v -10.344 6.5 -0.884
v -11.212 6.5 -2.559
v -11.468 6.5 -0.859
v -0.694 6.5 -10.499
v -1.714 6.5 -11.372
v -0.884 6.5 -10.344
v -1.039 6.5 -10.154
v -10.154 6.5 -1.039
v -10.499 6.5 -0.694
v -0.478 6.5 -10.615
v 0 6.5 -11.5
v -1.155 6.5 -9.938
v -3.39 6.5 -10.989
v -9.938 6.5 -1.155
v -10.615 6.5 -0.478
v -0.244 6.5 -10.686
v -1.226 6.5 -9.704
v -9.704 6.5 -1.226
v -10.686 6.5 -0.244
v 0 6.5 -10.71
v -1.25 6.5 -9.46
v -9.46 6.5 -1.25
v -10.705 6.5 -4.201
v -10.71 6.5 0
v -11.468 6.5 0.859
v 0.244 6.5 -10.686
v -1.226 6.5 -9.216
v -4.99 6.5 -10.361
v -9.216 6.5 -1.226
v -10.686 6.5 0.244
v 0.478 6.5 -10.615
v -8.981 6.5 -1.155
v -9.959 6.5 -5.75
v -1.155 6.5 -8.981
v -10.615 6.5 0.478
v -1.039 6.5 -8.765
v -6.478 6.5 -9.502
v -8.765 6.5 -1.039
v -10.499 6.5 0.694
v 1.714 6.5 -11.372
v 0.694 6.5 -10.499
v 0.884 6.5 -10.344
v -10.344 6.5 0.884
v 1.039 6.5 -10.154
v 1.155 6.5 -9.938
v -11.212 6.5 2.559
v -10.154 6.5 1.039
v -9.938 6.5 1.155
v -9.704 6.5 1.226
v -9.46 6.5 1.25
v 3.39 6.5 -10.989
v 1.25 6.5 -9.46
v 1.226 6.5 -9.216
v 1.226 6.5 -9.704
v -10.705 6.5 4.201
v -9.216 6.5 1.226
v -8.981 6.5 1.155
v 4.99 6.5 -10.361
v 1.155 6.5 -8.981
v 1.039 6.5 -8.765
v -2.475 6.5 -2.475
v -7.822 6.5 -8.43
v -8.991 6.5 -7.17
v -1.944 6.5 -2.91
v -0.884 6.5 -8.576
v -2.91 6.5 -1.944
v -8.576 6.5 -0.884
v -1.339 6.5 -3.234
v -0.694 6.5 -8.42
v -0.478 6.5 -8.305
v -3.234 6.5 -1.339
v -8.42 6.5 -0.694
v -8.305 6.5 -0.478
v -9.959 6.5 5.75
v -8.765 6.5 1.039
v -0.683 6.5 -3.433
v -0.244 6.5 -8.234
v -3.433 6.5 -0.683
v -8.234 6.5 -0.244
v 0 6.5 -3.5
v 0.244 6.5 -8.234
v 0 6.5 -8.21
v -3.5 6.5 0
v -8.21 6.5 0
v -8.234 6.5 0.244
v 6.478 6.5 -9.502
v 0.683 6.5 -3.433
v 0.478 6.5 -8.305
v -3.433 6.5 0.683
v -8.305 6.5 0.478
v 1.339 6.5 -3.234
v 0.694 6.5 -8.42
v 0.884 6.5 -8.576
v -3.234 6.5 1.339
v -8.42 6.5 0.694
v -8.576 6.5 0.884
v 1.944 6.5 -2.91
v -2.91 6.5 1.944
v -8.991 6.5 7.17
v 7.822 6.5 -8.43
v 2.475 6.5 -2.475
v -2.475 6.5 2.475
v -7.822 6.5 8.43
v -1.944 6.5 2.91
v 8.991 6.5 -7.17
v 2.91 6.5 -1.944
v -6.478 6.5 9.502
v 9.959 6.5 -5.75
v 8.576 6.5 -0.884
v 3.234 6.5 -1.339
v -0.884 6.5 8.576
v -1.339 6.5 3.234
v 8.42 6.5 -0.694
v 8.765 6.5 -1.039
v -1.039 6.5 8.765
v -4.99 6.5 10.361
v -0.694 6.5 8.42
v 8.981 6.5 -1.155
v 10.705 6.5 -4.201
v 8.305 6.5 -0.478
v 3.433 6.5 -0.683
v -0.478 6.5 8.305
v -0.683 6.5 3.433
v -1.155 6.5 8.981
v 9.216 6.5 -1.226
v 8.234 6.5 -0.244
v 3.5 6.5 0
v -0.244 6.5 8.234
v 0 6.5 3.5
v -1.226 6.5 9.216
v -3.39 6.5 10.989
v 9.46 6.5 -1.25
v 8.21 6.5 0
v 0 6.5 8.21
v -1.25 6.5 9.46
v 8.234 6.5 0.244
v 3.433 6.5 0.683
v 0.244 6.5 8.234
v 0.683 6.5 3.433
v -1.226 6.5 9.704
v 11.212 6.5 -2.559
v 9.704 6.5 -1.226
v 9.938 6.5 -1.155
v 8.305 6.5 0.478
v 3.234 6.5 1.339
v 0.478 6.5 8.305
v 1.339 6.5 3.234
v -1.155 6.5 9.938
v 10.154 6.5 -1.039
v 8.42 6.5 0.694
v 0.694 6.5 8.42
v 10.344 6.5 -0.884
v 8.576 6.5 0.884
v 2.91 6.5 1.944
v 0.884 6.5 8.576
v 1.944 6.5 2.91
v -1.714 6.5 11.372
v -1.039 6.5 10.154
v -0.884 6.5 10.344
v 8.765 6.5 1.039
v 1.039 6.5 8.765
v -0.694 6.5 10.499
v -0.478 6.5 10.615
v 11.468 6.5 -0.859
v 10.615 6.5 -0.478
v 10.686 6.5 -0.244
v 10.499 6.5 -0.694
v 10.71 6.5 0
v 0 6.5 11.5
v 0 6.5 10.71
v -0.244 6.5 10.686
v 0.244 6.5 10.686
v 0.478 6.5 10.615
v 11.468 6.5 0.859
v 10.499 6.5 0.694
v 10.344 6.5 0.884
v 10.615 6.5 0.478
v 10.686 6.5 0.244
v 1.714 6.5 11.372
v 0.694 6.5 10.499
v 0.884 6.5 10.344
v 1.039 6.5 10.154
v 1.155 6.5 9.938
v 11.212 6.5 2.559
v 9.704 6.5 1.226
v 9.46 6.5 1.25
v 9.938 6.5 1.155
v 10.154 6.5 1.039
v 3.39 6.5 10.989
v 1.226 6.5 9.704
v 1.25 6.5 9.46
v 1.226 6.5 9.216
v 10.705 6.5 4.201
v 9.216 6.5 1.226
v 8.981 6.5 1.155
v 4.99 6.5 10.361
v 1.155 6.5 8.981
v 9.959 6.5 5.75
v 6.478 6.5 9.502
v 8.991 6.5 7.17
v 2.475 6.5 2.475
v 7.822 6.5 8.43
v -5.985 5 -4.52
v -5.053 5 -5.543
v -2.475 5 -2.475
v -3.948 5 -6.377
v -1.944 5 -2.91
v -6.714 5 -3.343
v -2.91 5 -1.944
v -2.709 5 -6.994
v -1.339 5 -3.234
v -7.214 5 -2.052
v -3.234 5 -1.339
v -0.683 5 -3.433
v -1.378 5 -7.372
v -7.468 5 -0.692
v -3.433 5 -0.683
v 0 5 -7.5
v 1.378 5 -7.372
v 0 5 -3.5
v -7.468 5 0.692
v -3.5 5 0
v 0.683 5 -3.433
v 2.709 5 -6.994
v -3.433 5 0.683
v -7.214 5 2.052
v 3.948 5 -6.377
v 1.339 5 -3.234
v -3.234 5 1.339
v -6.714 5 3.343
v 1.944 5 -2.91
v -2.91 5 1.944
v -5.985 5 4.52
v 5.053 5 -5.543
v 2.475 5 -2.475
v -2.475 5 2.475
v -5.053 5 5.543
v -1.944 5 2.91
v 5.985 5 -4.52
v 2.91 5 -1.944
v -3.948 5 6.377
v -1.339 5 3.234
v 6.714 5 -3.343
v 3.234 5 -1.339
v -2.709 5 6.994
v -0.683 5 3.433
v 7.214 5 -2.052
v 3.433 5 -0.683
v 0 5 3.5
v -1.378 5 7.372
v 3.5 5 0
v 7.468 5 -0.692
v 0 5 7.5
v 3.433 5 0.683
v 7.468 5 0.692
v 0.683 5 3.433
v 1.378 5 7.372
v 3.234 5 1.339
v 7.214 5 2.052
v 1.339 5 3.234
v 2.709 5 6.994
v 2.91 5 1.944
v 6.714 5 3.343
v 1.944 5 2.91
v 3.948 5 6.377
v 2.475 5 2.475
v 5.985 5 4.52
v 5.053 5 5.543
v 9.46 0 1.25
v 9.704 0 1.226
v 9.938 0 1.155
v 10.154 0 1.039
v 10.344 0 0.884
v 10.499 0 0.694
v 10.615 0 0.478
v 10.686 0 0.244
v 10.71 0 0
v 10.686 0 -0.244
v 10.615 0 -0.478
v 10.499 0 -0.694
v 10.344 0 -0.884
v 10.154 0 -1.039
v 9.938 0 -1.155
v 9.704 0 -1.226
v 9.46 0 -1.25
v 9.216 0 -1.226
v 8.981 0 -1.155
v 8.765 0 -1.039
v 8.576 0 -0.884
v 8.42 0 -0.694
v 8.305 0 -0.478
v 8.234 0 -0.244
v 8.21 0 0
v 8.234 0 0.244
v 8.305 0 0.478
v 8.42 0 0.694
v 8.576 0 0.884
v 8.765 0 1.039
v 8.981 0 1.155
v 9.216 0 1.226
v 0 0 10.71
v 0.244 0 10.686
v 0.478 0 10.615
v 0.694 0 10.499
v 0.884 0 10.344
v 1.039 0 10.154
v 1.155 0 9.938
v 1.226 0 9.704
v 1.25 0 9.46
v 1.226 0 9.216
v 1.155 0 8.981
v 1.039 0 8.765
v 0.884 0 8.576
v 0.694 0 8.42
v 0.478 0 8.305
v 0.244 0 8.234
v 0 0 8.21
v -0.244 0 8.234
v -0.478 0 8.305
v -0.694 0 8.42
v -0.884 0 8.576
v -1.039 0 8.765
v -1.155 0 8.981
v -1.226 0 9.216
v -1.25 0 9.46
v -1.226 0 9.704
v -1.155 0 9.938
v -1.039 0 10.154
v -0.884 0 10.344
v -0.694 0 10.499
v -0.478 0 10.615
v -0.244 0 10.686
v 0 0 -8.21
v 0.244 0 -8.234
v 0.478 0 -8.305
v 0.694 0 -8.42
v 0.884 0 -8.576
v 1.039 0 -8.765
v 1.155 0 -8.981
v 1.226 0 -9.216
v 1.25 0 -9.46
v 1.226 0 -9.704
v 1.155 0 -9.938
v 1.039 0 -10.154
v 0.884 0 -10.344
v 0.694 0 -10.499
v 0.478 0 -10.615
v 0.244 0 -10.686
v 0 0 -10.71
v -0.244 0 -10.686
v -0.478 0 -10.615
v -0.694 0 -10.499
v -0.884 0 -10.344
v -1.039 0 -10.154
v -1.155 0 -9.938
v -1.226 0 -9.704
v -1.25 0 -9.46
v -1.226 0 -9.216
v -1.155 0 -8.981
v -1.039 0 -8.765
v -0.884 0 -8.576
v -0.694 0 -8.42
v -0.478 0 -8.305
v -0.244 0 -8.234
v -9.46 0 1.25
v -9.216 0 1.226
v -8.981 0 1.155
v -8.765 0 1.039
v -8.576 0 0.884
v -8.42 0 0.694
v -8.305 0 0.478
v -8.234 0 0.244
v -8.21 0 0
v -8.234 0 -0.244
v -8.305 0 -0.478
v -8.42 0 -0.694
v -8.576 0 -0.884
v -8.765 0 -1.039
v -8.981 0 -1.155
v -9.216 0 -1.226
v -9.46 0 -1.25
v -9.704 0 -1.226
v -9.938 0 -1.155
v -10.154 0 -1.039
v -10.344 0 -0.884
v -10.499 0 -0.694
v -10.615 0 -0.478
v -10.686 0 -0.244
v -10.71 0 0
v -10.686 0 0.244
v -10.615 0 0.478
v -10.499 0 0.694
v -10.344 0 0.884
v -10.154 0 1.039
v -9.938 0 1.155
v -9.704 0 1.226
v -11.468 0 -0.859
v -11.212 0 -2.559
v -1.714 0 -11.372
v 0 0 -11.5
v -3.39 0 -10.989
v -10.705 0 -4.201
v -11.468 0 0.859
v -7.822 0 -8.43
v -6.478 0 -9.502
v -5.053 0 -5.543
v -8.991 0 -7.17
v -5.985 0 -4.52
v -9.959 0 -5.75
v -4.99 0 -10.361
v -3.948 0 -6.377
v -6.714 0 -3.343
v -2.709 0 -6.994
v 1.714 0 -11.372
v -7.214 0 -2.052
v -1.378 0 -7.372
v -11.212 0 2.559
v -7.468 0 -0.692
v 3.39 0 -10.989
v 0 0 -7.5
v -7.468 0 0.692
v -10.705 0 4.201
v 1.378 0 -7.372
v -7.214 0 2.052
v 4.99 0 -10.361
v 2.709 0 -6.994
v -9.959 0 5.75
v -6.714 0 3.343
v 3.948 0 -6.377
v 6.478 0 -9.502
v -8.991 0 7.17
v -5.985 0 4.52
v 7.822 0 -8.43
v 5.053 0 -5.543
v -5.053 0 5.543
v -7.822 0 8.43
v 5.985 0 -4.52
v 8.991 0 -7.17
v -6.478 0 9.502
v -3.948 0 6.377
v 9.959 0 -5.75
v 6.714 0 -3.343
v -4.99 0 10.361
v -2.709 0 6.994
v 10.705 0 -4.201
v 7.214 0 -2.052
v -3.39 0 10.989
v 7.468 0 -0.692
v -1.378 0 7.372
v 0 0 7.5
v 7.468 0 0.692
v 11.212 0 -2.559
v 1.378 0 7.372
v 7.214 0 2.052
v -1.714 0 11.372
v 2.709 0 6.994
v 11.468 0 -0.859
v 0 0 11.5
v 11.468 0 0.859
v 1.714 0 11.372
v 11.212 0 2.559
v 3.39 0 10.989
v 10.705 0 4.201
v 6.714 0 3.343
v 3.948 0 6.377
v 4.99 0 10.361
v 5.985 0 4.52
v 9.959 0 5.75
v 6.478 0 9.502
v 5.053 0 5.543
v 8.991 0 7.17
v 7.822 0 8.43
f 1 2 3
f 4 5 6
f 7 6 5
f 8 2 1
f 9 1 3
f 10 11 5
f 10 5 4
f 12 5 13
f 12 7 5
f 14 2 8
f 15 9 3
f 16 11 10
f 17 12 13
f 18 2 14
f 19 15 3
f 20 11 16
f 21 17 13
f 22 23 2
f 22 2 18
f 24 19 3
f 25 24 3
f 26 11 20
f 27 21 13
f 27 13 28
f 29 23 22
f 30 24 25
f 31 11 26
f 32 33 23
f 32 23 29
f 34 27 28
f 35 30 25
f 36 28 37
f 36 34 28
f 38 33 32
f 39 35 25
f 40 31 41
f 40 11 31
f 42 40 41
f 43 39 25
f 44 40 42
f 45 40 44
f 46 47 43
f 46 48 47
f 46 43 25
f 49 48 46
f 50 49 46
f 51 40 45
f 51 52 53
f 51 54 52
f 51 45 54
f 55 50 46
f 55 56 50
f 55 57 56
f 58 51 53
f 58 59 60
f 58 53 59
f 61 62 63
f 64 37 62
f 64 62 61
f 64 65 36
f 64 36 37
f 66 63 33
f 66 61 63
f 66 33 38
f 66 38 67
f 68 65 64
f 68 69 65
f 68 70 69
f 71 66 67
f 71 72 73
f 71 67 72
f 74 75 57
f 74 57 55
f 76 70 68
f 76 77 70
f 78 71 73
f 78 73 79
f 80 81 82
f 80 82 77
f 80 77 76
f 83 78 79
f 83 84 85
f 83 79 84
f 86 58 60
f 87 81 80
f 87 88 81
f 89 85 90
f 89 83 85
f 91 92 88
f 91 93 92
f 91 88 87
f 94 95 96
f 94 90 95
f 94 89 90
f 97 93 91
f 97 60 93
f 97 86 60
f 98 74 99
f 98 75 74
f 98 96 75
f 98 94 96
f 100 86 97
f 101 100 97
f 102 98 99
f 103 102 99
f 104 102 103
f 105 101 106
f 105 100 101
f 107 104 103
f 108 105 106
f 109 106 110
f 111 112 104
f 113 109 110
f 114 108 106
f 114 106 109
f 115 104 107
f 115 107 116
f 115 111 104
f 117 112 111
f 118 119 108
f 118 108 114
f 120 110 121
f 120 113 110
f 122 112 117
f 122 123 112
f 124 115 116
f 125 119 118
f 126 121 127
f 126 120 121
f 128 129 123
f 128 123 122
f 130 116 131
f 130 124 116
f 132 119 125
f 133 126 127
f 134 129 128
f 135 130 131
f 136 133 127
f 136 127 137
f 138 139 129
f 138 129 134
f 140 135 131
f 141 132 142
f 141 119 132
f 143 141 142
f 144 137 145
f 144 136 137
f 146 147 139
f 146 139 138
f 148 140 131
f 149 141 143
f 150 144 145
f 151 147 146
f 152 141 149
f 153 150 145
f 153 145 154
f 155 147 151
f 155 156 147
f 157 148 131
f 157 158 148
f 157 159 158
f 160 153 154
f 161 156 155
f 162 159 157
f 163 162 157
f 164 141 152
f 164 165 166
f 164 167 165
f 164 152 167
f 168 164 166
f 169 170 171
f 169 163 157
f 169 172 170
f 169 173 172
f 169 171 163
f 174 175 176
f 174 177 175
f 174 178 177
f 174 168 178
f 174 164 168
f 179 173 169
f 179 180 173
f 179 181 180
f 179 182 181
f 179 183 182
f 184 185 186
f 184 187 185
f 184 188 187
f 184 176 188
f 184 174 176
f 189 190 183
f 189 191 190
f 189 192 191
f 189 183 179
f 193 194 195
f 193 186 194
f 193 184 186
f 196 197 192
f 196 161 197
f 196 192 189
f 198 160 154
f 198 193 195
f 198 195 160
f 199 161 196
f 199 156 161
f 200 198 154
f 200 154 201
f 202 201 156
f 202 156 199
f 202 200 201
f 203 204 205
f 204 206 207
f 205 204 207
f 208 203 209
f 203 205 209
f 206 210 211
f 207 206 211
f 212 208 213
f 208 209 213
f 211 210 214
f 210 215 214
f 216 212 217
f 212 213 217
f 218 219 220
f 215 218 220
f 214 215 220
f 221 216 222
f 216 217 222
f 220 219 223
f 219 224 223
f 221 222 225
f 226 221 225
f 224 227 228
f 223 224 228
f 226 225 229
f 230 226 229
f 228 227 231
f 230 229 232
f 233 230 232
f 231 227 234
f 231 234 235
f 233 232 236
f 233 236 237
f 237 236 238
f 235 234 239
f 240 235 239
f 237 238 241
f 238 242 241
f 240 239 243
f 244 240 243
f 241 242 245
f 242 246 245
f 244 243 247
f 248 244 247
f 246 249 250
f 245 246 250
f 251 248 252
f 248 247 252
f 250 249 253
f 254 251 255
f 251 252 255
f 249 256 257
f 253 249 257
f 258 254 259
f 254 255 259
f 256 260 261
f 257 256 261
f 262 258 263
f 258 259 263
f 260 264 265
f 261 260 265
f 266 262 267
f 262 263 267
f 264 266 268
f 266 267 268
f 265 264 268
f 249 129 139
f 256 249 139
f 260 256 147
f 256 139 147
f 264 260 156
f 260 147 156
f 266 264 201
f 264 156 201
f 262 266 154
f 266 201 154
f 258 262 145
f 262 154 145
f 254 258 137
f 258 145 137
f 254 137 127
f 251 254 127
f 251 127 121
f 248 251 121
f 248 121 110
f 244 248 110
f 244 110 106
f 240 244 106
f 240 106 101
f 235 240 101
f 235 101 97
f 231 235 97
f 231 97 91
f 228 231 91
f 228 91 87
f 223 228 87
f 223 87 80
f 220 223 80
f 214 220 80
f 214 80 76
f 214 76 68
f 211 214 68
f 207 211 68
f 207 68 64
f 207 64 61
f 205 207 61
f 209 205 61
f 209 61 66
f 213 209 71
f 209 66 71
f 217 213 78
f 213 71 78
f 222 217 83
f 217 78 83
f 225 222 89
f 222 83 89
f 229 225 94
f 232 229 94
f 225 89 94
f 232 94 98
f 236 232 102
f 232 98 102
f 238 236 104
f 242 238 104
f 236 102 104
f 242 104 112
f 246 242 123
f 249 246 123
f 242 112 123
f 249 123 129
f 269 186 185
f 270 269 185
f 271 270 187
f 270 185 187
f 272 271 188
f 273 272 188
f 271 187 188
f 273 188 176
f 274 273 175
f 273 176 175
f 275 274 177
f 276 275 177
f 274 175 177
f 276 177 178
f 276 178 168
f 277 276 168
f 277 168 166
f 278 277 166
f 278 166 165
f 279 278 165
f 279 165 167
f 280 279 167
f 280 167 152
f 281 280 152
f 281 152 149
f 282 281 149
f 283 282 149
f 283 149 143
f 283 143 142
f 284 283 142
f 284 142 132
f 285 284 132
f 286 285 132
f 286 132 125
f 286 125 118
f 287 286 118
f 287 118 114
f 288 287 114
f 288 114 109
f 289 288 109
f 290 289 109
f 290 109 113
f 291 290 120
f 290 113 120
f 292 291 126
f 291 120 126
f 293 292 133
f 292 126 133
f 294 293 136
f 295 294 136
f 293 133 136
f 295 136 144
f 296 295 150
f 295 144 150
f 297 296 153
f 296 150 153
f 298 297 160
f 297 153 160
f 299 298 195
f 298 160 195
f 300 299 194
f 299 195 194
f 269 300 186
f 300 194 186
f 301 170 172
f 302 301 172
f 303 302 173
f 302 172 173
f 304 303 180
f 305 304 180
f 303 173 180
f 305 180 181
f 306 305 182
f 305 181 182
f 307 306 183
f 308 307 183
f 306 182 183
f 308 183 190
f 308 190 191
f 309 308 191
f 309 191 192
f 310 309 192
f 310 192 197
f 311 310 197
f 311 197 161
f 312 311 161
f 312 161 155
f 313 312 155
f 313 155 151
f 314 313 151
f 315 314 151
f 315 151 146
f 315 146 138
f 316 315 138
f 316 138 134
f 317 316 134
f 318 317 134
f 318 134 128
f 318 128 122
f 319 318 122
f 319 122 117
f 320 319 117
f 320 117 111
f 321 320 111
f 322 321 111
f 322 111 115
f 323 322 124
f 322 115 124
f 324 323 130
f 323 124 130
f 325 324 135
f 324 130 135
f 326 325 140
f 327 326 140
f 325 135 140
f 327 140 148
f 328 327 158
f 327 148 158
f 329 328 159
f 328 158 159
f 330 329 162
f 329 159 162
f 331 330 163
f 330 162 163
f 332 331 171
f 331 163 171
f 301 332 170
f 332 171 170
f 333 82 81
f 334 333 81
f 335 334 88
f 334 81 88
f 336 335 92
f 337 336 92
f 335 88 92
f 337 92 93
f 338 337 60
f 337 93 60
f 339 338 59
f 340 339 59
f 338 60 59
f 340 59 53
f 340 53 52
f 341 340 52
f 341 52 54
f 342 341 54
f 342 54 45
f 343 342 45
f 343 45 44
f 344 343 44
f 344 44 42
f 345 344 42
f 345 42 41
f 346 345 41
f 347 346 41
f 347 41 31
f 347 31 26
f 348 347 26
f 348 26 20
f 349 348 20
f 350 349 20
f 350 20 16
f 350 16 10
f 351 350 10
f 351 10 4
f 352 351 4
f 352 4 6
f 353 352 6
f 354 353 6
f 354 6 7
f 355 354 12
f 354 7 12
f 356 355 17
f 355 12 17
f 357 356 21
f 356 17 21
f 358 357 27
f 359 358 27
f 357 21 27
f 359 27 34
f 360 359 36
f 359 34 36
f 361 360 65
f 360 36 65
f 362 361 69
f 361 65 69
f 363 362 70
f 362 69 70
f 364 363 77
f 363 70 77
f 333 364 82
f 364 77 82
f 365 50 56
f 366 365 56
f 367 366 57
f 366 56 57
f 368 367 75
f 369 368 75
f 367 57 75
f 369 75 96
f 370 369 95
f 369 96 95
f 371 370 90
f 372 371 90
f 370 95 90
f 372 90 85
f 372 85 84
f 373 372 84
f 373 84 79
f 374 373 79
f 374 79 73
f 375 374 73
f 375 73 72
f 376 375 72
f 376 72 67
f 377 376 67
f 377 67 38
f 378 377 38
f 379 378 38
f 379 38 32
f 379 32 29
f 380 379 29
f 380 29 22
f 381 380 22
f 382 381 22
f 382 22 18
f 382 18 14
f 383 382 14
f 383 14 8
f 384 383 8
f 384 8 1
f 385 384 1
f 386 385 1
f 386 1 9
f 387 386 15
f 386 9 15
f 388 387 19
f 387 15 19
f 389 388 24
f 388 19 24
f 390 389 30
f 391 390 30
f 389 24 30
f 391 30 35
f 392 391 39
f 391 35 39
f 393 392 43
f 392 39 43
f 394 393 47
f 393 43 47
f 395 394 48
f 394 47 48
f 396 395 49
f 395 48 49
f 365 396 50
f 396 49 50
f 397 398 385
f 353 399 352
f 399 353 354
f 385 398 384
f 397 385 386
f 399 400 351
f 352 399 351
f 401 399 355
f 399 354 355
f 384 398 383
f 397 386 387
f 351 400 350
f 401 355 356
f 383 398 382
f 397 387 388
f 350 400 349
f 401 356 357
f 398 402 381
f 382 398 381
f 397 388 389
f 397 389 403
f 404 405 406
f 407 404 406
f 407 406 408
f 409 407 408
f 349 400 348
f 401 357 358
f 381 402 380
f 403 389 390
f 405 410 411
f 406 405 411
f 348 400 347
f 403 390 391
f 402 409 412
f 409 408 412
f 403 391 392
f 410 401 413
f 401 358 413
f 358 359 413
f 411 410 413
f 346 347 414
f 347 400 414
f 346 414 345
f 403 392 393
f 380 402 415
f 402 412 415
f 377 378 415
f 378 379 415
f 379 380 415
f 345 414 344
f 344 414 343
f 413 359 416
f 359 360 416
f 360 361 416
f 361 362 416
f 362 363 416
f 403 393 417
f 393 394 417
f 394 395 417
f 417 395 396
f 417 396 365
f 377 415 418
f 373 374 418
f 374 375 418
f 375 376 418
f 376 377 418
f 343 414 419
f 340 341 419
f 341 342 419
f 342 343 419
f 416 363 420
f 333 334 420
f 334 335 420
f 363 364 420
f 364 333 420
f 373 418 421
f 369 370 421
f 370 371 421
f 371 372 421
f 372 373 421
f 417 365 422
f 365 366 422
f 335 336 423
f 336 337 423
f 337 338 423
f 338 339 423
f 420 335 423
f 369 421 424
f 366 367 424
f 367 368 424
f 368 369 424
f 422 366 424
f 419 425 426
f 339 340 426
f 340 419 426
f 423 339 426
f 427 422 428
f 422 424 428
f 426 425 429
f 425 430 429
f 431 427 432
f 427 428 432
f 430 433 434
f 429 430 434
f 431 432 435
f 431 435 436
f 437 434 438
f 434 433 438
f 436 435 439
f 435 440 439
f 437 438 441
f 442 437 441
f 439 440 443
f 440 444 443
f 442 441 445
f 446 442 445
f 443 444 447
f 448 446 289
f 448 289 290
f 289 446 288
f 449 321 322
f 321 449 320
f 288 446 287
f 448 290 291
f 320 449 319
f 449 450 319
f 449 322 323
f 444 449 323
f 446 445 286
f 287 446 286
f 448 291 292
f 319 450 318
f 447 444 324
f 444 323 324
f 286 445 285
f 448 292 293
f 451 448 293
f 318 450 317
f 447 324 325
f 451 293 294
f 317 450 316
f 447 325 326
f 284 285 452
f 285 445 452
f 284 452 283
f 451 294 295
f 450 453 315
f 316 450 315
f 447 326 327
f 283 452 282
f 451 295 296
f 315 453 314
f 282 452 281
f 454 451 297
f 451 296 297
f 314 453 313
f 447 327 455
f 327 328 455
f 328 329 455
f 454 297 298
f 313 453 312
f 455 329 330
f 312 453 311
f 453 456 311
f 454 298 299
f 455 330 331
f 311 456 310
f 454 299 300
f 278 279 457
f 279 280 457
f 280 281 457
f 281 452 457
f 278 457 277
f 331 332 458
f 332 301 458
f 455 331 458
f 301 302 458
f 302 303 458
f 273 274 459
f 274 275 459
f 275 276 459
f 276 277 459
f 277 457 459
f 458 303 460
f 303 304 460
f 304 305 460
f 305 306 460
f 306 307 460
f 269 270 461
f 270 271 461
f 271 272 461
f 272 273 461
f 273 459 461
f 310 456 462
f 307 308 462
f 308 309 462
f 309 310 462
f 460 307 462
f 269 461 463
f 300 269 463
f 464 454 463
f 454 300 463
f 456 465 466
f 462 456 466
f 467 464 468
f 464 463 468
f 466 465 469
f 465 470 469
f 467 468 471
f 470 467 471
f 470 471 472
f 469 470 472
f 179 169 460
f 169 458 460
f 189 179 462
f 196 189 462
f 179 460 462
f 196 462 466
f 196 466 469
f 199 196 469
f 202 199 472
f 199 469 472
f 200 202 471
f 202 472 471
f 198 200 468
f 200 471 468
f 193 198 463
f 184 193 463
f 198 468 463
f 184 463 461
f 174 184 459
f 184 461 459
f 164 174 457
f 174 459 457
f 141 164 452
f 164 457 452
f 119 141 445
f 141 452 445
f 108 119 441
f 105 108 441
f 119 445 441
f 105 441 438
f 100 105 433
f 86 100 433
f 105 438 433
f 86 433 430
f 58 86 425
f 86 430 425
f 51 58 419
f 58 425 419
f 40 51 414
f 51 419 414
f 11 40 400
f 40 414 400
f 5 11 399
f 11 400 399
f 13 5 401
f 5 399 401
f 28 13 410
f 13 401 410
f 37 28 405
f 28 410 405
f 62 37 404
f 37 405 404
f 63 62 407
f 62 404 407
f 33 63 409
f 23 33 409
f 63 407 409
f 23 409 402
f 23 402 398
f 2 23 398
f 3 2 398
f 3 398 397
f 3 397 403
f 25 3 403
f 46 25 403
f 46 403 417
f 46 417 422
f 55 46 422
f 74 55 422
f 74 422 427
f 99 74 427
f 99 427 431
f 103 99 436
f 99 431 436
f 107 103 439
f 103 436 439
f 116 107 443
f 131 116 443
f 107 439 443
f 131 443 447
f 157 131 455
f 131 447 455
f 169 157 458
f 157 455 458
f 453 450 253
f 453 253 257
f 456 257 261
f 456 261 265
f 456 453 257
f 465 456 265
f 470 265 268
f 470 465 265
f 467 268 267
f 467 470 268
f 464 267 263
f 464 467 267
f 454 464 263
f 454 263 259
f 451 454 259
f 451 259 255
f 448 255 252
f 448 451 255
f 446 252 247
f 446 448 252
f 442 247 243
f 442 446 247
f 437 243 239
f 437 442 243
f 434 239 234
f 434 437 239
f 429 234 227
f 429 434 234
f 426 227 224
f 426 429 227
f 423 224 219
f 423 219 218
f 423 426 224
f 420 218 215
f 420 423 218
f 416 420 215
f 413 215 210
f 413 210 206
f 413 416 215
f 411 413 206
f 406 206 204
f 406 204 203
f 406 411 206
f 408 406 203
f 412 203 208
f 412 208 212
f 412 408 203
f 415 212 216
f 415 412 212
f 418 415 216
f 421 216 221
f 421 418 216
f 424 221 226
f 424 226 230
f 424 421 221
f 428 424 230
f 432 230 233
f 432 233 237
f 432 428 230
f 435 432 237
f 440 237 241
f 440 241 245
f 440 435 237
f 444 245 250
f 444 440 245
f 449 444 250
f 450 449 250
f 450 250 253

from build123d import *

# Parameters (mm, degrees)
SKETCH_1_R          = 11.5
SKETCH_1_R_2        = 7.5
EXTRUDE_1_DEPTH     = 5
SKETCH_2_R          = 11.5
EXTRUDE_3_DEPTH     = 1.5
SKETCH_3_R          = 1.25
CUT_EXTRUDE_4_DEPTH = 18.514279888
SKETCH_4_R          = 3.5
CUT_EXTRUDE_5_DEPTH = 18.514279888


with BuildPart() as part:
    # Эскиз1 → Вытянуть1 (new body)
    with BuildSketch(Plane(origin=(0, 0, 0), x_dir=(1, 0, 0), z_dir=(0, 1, 0))):
        with Locations(Location((0, 0, 0), (0, 0, 270))):
            Circle(SKETCH_1_R)
        with Locations(Location((0, 0, 0), (0, 0, 270))):
            Circle(SKETCH_1_R_2, mode=Mode.SUBTRACT)
    extrude(amount=EXTRUDE_1_DEPTH)

    # Эскиз2 → Вытянуть3 (add)
    with BuildSketch(Plane(origin=(0, 5, 0), x_dir=(1, 0, 0), z_dir=(0, 1, 0))):
        with Locations(Location((0, 0, 0), (0, 0, 270))):
            Circle(SKETCH_2_R)
    extrude(amount=EXTRUDE_3_DEPTH)

    # Эскиз3 → Вытянуть4 (cut, through all)
    with BuildSketch(Plane(origin=(0, 6.5, 0), x_dir=(-1, 0, 0), z_dir=(0, 1, 0))):
        with Locations(Location((0, -9.45968553, 0), (0, 0, 90))):
            Circle(SKETCH_3_R)
        with Locations(Location((-9.45968553, 0, 0), (0, 0, 90))):
            Circle(SKETCH_3_R)
        with Locations(Location((0, 9.45968553, 0), (0, 0, 90))):
            Circle(SKETCH_3_R)
        with Locations(Location((9.45968553, 0, 0), (0, 0, 90))):
            Circle(SKETCH_3_R)
    extrude(amount=-CUT_EXTRUDE_4_DEPTH, mode=Mode.SUBTRACT)

    # Эскиз4 → Вытянуть5 (cut, through all)
    with BuildSketch(Plane(origin=(0, 6.5, 0), x_dir=(-1, 0, 0), z_dir=(0, 1, 0))):
        with Locations(Location((0, 0, 0), (0, 0, 90))):
            Circle(SKETCH_4_R)
    extrude(amount=-CUT_EXTRUDE_5_DEPTH, mode=Mode.SUBTRACT)


solid = part.part
